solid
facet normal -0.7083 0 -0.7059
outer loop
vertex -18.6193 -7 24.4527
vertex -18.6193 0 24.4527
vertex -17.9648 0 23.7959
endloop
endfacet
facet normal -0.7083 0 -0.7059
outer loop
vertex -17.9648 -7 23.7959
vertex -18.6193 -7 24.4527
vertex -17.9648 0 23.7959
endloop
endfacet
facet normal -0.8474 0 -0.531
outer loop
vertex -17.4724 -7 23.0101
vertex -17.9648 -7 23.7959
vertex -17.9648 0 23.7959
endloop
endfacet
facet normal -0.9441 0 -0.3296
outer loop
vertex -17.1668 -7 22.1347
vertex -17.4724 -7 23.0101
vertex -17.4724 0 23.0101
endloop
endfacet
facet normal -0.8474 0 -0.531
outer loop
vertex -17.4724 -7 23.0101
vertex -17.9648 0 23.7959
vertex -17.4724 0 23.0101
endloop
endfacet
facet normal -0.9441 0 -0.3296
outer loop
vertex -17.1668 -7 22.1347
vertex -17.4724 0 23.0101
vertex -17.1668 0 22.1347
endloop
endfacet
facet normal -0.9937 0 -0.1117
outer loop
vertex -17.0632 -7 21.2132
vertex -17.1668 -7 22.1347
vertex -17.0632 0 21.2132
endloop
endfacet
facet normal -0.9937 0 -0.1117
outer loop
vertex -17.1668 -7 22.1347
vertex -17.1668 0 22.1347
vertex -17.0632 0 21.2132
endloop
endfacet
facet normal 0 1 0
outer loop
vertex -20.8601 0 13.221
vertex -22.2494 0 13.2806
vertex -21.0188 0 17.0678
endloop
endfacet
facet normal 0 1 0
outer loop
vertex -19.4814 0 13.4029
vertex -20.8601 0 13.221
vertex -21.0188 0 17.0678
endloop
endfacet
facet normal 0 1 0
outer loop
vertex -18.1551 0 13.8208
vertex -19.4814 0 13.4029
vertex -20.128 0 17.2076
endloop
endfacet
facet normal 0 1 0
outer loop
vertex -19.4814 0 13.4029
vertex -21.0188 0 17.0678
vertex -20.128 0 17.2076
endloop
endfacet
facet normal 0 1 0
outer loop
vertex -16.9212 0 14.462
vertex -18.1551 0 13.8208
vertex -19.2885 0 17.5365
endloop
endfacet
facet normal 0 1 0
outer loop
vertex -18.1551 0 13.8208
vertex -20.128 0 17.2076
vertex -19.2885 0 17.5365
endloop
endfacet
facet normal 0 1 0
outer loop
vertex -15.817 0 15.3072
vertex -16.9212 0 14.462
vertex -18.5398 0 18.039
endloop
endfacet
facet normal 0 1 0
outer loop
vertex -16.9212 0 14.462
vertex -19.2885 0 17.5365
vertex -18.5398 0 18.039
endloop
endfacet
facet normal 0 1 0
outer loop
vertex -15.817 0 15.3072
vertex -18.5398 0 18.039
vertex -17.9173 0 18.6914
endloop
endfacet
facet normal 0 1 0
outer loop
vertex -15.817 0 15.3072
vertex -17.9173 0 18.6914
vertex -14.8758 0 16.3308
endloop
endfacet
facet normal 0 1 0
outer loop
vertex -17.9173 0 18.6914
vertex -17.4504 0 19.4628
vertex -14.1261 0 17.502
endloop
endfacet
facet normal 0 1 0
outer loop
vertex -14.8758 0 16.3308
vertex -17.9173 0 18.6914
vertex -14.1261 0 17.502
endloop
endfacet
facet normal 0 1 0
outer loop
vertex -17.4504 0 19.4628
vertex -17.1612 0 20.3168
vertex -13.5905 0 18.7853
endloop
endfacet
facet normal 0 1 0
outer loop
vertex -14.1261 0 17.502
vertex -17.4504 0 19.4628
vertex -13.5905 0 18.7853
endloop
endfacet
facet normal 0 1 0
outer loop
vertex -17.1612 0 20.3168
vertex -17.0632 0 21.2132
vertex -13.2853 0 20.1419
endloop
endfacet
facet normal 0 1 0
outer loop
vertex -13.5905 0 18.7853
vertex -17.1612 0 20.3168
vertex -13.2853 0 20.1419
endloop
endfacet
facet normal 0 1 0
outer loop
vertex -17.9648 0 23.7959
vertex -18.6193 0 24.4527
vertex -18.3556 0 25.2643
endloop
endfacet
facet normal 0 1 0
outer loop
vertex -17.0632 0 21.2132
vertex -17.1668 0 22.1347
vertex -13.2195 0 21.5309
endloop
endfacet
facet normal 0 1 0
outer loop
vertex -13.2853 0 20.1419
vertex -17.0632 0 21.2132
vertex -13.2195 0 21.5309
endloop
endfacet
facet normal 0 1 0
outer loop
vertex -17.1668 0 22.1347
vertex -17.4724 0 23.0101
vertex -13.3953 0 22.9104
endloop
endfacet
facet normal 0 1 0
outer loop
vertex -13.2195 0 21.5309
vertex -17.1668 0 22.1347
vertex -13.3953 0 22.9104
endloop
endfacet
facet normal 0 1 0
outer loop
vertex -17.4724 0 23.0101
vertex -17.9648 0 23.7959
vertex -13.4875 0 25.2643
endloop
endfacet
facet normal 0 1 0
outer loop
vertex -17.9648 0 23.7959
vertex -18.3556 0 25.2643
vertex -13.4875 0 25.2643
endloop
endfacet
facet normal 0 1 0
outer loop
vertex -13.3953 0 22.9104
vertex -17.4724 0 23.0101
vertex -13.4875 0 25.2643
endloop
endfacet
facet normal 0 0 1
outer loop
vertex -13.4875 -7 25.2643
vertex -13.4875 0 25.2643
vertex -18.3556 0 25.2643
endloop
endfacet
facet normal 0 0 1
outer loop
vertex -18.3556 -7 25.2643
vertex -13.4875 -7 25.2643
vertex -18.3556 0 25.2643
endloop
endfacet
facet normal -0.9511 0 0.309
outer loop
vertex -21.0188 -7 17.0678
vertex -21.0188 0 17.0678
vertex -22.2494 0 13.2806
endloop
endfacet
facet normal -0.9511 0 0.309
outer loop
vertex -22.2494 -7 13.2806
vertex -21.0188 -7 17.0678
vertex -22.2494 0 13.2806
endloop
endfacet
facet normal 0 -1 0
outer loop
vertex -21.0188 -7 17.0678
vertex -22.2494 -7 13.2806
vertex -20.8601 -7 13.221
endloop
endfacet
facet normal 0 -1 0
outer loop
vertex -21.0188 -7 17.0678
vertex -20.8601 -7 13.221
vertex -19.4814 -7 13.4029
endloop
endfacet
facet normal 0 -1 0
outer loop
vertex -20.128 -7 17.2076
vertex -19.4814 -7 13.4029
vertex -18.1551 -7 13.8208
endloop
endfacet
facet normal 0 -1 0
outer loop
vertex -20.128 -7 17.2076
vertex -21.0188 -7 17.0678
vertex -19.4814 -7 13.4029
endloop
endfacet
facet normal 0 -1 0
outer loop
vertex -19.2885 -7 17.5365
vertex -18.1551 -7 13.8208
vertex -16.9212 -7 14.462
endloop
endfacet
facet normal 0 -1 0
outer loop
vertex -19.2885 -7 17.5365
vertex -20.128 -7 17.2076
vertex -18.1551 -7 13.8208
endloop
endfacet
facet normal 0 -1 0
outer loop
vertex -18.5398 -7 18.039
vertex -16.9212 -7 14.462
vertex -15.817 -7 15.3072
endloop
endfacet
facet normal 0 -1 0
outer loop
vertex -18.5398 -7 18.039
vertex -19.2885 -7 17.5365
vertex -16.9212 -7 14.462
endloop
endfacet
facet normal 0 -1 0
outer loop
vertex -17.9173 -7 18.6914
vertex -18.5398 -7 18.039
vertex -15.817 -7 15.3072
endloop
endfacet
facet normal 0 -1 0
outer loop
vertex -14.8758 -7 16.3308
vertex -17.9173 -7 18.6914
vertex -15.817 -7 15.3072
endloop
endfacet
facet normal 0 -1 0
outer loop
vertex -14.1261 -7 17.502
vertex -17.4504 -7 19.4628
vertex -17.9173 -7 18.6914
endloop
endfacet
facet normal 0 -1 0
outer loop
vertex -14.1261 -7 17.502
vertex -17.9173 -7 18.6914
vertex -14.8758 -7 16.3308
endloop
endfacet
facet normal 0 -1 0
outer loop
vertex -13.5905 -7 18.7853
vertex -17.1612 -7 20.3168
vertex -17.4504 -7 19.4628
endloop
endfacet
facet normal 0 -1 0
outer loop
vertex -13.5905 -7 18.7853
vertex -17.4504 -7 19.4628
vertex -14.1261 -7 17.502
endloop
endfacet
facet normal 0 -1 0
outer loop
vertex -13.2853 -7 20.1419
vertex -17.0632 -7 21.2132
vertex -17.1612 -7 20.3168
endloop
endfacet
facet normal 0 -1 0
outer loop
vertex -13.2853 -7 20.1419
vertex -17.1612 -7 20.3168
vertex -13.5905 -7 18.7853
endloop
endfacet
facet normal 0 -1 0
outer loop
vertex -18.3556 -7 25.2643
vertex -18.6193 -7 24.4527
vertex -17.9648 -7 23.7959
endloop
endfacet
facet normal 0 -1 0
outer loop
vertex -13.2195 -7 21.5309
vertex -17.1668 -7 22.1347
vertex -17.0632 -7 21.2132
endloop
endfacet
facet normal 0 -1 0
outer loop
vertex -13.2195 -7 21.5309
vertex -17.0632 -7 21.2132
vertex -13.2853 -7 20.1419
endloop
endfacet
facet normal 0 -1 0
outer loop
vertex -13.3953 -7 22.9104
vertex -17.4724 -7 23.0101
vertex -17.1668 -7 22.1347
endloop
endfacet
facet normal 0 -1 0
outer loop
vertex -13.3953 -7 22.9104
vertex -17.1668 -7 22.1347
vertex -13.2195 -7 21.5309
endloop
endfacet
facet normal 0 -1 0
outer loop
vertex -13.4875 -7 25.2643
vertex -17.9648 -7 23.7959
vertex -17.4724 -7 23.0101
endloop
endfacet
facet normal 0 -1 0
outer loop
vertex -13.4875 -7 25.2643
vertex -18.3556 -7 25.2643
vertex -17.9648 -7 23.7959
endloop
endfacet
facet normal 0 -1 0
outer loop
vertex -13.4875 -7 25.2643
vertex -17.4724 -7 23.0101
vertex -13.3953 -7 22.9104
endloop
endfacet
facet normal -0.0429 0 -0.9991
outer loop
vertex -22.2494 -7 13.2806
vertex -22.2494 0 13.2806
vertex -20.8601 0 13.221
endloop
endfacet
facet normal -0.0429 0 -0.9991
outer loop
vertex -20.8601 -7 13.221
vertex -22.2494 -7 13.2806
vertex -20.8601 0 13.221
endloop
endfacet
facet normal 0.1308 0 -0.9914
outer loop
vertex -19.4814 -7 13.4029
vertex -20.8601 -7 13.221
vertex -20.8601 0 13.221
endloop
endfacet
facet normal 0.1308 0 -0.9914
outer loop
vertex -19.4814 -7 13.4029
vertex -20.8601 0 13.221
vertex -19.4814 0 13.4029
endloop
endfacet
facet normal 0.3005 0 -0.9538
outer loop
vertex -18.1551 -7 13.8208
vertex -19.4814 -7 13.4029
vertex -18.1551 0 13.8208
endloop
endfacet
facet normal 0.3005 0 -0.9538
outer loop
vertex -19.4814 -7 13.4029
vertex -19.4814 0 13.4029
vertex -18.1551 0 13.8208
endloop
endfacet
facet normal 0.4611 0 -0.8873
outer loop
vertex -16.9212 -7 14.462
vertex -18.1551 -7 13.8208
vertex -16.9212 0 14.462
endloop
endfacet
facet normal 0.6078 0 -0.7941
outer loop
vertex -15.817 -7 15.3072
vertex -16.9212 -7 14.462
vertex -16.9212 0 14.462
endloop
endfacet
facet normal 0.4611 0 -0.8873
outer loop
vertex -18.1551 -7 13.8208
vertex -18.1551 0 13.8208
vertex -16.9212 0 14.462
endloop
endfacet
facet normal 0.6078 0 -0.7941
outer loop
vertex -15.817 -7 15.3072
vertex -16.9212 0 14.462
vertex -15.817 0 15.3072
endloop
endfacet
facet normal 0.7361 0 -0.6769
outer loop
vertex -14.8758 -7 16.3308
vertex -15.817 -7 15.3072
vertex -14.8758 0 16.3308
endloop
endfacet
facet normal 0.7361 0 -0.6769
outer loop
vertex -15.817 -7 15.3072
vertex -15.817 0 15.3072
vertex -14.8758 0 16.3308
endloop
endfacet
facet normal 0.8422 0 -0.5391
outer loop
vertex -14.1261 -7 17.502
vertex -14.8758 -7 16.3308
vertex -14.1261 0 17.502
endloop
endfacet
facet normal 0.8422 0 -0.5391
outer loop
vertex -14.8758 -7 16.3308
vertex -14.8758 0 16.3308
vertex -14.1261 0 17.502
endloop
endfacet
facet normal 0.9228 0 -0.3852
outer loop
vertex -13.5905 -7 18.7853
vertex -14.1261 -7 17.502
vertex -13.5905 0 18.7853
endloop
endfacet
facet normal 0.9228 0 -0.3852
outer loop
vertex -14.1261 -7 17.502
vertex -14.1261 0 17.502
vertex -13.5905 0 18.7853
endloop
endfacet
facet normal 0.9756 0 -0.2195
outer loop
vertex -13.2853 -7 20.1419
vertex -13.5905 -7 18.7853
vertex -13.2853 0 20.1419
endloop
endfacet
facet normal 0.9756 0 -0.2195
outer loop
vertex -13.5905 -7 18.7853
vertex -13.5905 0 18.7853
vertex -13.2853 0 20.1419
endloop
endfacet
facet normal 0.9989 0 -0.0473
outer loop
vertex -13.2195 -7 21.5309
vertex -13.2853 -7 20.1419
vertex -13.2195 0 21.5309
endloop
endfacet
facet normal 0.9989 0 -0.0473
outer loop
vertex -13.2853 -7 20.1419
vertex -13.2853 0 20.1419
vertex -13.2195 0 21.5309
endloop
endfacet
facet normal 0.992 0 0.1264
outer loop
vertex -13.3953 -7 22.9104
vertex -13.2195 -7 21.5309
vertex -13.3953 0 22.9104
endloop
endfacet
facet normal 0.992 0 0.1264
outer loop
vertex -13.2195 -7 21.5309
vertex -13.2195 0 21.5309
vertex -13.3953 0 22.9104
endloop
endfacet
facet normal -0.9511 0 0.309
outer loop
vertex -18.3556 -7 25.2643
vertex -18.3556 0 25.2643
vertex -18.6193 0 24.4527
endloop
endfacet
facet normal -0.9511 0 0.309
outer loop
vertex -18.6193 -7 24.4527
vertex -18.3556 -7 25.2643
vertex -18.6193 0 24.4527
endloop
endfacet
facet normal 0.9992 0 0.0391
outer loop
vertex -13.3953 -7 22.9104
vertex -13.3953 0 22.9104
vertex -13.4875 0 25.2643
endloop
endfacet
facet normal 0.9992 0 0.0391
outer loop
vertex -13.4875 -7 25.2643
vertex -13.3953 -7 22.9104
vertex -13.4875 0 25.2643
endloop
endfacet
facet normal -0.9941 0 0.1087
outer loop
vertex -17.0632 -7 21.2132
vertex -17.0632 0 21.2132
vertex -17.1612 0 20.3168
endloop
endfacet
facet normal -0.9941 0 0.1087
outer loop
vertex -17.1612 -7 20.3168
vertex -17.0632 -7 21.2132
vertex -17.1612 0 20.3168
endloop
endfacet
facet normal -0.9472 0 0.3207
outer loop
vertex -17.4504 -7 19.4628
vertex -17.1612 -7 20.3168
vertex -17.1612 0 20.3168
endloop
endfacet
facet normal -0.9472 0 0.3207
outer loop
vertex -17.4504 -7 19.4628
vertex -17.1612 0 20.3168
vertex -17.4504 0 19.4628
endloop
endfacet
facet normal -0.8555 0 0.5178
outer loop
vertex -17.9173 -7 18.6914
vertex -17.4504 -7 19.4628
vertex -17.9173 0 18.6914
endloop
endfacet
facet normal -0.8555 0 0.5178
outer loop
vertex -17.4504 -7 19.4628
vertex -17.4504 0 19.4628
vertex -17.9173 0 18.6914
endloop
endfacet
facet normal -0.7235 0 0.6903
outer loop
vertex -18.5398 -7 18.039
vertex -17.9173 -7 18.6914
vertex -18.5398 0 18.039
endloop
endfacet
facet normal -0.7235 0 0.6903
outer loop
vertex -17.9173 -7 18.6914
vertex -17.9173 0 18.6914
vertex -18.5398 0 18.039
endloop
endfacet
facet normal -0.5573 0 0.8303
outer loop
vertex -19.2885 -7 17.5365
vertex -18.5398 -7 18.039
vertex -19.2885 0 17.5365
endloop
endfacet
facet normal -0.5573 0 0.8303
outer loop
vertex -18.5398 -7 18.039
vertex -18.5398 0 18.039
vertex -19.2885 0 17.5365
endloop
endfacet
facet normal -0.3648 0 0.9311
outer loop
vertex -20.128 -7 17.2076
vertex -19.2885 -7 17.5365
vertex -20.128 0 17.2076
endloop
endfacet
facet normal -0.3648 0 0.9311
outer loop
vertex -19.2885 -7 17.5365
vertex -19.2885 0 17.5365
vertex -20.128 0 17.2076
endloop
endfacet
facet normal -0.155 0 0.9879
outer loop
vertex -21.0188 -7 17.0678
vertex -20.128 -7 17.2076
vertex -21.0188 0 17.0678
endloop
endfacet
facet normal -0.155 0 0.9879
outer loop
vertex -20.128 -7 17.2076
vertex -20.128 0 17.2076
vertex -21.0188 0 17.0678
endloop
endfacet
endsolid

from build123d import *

# Parameters (mm, degrees)
F1_DEPTH = 7


with BuildPart() as f1:
    # F0 (on Front) → F1 (new body)
    with BuildSketch(Plane.XZ):
        with BuildLine():
            ThreePointArc((-18.6193257059, 24.4526938776), (-17.4724085616, 23.0101324022), (-17.0632034356, 21.2132034356))
            ThreePointArc((-17.0632034356, 21.2132034356), (-18.2107776829, 18.3482532441), (-21.0188369777, 17.0677575392))
            Line((-21.0188369777, 17.0677575392), (-22.249362675, 13.2805888584))
            ThreePointArc((-22.249362675, 13.2805888584), (-15.3241365798, 15.7985112404), (-13.3952950657, 22.9103506653))
            Line((-13.3952950657, 22.9103506653), (-13.4874691837, 25.2643290081))
            Line((-13.4874691837, 25.2643290081), (-18.3556094659, 25.2643290081))
            Line((-18.3556094659, 25.2643290081), (-18.6193257059, 24.4526938776))
        make_face()
    extrude(amount=F1_DEPTH)


solid = f1.part
